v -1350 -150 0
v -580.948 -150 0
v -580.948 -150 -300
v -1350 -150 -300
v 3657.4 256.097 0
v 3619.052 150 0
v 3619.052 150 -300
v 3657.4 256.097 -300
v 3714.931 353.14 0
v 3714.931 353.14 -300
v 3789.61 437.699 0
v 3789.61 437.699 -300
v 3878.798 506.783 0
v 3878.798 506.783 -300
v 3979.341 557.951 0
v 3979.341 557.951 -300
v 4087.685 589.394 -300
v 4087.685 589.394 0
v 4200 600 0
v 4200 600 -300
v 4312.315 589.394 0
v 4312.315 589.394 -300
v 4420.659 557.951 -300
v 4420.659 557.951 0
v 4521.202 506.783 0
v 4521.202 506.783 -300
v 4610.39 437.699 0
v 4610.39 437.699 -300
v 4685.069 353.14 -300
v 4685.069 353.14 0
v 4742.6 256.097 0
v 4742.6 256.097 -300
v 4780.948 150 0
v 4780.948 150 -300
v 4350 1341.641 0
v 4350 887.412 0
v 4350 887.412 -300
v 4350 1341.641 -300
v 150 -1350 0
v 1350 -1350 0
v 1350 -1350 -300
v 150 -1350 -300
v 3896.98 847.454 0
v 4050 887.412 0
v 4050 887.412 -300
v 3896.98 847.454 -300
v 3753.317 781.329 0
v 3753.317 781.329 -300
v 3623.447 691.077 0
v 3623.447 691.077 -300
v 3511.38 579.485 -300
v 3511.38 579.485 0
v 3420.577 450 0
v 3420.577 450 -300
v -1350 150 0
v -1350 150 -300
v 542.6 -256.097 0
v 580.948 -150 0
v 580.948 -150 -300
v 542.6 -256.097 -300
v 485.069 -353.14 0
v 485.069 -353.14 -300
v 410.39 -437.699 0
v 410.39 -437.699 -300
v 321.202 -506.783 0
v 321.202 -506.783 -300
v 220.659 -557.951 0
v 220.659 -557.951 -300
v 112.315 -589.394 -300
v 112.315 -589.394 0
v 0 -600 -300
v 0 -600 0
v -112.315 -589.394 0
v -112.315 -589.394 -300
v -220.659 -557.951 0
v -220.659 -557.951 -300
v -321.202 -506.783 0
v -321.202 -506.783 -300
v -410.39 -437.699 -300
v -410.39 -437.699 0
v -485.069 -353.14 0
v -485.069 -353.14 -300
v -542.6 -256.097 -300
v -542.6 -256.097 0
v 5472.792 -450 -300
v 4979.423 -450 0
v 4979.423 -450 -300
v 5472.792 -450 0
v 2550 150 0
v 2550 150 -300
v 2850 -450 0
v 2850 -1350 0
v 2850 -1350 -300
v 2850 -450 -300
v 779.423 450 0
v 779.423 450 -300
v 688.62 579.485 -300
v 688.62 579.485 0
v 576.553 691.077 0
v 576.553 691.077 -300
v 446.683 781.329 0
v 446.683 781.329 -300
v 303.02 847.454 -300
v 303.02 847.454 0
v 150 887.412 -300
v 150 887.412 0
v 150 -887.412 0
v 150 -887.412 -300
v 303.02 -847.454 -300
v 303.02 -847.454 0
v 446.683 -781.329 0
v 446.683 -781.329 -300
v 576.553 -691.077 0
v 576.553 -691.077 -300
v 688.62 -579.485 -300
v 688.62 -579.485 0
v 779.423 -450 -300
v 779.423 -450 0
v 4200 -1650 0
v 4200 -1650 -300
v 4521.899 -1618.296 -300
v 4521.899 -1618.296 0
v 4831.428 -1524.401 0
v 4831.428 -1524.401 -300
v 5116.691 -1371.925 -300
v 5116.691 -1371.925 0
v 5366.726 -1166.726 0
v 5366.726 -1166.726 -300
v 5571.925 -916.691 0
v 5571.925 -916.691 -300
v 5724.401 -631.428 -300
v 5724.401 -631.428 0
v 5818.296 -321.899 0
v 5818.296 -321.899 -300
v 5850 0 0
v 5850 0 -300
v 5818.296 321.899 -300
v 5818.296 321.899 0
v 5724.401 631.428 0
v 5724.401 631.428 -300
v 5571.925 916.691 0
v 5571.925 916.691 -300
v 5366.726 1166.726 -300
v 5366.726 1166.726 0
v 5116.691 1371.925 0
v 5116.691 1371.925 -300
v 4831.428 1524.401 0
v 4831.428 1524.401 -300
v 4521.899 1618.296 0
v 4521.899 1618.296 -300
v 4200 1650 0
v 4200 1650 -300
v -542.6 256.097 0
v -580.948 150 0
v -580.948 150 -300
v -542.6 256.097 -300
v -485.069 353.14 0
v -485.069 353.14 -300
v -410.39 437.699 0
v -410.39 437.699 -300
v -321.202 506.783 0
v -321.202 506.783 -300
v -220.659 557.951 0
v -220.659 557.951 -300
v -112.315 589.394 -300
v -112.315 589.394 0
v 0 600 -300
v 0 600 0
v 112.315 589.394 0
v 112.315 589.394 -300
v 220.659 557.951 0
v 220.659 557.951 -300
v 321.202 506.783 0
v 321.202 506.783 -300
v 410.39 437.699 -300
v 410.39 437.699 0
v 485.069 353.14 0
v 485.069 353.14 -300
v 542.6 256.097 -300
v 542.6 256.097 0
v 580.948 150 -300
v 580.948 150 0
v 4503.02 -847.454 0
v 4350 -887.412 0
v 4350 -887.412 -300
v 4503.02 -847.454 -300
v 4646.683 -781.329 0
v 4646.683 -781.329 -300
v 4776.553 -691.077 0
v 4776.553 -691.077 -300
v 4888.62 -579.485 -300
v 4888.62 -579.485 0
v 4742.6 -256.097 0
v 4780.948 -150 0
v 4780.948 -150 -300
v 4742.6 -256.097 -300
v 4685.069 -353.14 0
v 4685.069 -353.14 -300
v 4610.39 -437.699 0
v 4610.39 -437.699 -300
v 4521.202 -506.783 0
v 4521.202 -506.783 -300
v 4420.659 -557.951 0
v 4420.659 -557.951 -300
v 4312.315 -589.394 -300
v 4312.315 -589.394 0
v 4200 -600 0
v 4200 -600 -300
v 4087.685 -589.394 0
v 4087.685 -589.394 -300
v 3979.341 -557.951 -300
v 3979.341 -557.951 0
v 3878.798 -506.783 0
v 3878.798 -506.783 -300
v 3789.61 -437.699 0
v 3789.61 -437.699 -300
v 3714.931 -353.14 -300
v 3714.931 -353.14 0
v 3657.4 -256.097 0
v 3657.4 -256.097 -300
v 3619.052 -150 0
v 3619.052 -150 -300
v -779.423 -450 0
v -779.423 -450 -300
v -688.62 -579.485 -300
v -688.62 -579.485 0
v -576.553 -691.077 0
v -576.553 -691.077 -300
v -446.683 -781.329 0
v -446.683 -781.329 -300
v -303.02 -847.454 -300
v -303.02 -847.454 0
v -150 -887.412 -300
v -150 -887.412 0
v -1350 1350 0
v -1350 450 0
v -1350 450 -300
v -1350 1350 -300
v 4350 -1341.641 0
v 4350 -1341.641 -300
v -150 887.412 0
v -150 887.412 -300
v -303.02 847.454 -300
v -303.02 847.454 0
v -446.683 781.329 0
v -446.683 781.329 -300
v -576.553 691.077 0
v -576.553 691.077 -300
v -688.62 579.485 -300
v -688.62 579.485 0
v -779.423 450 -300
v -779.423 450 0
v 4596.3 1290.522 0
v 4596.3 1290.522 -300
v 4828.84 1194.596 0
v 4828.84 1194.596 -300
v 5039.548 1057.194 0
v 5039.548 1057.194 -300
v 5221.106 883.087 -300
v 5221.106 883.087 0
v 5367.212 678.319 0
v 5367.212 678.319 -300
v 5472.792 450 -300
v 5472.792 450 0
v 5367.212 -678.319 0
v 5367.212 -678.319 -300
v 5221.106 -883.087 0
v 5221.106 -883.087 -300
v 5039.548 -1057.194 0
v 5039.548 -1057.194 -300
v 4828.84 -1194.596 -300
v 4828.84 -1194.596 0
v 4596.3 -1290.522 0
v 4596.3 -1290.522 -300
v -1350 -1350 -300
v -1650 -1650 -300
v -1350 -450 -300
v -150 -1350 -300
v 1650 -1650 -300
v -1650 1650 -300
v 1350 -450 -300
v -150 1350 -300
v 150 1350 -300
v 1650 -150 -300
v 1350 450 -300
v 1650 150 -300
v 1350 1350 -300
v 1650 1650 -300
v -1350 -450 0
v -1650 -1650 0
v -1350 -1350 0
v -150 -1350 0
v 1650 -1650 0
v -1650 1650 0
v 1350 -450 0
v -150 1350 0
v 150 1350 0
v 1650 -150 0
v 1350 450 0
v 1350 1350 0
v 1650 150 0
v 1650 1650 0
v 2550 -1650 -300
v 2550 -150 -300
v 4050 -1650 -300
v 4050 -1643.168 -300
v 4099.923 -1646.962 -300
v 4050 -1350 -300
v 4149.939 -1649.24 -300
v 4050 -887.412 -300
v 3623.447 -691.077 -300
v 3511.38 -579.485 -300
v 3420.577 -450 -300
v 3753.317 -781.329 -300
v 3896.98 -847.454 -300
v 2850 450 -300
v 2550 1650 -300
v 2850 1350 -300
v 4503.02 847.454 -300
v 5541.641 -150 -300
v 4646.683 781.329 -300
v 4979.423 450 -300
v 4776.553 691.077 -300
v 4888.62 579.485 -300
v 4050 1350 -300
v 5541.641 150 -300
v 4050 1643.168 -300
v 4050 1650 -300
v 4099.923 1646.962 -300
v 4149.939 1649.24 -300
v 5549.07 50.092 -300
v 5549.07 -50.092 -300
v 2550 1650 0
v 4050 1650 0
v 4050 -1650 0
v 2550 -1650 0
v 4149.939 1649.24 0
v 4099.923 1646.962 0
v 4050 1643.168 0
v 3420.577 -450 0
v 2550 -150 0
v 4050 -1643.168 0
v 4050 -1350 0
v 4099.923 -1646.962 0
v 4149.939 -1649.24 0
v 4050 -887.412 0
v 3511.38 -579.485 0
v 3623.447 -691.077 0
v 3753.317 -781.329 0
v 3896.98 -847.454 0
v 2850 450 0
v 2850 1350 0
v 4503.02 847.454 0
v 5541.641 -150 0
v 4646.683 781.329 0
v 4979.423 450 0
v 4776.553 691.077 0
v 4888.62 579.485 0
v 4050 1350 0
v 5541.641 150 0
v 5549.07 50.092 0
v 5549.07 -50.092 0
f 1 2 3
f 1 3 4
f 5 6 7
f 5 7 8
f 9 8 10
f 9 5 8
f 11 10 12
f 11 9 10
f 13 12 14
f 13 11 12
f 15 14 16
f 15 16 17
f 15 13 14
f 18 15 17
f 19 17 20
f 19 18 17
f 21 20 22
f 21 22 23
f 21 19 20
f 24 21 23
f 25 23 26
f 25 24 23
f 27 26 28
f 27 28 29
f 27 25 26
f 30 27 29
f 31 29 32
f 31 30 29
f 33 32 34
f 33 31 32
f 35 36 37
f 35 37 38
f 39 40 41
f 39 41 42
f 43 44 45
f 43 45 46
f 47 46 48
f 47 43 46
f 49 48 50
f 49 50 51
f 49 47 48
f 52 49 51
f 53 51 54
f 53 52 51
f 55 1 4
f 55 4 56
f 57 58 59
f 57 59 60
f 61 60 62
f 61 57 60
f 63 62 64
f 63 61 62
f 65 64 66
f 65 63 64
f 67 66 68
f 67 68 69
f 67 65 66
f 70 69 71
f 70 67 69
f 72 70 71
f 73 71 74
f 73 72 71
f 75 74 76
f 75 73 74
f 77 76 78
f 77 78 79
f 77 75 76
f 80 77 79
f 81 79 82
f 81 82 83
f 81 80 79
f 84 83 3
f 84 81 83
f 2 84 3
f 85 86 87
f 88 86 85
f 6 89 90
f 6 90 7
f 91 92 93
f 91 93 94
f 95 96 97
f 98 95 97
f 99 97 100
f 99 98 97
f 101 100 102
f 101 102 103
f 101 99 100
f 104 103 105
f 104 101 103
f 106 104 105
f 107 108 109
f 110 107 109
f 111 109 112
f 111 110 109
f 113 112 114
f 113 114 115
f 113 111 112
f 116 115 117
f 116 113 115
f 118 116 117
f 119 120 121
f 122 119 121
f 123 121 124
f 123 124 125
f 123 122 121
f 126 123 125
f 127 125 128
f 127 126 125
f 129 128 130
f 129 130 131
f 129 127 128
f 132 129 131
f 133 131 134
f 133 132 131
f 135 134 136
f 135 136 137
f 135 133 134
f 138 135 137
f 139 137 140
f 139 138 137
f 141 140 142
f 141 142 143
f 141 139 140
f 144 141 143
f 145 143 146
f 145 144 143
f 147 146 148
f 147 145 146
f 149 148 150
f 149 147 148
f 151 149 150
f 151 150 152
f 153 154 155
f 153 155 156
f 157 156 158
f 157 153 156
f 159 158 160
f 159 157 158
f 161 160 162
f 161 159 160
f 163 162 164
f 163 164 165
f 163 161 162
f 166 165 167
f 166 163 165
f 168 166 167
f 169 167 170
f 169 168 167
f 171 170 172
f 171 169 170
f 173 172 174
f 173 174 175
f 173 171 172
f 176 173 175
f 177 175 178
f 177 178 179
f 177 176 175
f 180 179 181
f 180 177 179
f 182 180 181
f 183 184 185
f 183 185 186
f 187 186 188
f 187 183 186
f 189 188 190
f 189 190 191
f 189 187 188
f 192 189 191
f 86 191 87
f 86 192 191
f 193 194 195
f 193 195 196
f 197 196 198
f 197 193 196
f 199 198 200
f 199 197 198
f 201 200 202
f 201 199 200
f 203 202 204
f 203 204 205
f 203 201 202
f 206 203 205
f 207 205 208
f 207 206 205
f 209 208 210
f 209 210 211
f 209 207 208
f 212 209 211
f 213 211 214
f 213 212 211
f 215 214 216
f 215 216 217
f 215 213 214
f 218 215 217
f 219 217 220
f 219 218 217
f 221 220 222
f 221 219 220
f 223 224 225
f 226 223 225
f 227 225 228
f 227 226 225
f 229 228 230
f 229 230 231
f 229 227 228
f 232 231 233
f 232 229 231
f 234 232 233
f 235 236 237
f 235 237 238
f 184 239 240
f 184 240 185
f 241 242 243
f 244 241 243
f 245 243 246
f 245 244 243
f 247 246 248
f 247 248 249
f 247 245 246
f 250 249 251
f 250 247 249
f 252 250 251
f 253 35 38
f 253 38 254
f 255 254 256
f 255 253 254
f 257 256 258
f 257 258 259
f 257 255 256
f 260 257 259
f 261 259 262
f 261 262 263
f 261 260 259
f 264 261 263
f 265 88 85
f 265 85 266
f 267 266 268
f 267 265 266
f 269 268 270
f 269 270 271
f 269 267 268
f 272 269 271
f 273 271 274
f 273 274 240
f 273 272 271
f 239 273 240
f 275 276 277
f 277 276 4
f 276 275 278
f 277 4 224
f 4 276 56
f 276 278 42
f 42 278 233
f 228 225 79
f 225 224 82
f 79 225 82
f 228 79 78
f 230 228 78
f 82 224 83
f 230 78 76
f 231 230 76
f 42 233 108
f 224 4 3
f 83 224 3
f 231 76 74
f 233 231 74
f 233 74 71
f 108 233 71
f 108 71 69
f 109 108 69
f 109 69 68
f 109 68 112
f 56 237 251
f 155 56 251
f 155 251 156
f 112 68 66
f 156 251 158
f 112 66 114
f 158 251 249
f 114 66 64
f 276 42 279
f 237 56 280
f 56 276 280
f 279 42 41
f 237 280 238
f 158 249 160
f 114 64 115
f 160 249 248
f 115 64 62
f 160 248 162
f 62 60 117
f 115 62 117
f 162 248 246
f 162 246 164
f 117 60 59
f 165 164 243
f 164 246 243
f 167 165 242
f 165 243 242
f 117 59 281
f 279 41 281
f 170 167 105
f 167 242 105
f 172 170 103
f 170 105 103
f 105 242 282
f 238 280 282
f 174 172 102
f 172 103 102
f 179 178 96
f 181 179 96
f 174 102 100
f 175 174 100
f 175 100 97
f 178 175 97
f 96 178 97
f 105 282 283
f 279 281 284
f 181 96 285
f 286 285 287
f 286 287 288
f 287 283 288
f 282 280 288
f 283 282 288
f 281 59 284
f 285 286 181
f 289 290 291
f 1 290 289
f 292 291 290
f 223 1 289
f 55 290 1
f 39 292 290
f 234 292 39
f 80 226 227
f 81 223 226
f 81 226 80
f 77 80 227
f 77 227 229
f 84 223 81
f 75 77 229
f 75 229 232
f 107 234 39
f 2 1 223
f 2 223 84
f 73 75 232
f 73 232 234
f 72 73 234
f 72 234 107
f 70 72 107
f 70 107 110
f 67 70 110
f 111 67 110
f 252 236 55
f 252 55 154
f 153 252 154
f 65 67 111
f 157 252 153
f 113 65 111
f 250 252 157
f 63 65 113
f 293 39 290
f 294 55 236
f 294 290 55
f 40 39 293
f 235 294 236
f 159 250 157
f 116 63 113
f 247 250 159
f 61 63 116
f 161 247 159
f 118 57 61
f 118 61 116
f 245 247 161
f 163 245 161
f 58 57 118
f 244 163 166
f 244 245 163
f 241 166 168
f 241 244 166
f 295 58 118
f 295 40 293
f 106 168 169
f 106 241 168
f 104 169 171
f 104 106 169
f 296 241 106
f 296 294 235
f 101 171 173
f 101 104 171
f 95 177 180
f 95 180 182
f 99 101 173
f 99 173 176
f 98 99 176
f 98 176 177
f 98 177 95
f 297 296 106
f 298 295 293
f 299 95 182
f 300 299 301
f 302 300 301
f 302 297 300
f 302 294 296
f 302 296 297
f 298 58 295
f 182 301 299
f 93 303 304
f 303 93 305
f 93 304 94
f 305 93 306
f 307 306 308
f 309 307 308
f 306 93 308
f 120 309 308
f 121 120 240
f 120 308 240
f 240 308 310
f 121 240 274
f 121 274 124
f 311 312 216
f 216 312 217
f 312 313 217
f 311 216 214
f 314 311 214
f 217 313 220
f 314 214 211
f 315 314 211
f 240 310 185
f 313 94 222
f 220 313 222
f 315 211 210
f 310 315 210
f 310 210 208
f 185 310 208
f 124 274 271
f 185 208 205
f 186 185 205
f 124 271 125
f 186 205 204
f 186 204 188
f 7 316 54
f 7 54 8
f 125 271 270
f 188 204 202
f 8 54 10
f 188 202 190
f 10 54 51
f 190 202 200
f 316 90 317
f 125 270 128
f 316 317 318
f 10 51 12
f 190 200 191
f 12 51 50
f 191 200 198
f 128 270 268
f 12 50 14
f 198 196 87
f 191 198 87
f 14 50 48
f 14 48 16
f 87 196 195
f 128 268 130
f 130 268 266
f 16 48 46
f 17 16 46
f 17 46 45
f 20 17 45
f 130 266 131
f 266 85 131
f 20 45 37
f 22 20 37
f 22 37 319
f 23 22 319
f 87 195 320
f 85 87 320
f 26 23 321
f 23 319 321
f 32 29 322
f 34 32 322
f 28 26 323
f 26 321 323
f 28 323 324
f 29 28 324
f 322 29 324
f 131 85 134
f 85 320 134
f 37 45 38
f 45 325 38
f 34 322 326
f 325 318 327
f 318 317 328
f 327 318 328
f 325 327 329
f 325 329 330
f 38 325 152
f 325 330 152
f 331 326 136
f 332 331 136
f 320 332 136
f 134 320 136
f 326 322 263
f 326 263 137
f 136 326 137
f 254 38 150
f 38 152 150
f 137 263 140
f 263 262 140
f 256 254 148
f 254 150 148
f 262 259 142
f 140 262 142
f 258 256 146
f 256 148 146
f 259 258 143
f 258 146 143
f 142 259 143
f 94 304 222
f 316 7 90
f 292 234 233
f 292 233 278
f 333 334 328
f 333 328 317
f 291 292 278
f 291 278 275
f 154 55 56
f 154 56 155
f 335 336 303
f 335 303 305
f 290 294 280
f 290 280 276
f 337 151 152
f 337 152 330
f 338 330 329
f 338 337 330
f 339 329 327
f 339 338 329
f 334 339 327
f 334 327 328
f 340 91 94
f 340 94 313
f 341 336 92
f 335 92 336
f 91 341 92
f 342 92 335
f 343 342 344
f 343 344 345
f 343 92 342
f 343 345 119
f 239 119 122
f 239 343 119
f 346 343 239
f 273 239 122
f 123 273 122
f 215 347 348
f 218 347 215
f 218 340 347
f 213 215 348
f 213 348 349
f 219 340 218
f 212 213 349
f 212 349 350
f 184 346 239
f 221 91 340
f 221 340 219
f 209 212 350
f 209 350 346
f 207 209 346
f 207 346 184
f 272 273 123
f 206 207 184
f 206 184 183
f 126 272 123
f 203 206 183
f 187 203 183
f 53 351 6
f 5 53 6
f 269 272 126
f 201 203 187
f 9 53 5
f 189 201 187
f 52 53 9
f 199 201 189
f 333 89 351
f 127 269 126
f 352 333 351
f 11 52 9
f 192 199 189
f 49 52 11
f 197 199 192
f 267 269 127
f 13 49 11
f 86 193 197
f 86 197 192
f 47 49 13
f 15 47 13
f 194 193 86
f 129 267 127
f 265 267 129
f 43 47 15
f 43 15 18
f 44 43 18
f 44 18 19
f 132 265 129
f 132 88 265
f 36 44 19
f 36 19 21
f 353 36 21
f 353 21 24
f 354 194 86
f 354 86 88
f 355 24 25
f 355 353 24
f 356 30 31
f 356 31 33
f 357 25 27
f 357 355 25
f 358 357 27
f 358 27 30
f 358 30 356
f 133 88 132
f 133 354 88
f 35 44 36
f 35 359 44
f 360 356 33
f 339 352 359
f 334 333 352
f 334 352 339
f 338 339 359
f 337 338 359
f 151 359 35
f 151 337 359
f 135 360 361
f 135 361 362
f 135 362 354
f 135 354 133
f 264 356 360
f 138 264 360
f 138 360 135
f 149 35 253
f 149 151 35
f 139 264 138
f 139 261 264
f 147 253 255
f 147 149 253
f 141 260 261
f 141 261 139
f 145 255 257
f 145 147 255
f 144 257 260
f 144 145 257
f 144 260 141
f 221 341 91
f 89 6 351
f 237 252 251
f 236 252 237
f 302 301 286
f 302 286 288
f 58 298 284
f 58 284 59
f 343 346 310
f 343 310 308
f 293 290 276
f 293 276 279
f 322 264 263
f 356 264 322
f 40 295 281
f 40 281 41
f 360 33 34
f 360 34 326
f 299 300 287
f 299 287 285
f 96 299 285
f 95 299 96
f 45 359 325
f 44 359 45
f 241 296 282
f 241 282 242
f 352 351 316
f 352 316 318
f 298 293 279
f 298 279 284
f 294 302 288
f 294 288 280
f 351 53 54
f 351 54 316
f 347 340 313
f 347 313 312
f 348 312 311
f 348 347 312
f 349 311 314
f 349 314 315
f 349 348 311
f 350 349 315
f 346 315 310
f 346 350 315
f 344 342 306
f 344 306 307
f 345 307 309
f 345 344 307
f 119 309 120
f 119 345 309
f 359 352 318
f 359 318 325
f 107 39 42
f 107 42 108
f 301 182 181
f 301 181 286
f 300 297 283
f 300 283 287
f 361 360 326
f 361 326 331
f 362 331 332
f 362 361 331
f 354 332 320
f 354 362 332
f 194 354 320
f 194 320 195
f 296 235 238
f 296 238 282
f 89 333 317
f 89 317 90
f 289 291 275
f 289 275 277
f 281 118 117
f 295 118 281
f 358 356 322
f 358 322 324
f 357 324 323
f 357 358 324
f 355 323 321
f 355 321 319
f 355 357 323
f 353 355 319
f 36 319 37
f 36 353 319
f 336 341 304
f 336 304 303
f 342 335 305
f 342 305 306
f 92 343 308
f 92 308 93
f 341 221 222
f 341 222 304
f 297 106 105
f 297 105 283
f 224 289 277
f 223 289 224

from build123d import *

# Parameters (mm, degrees)
F1_DEPTH = 300


with BuildPart() as f1:
    # F0 (on Top) → F1 (new body)
    with BuildSketch(Plane.XY):
        with BuildLine():
            Line((1650, 1650), (-1650, 1650))
            Line((-1650, 1650), (-1650, 450))
            Line((-1650, 450), (-1650, 150))
            Line((-1650, 150), (-1650, -191.250503))
            Line((-1650, -191.250503), (-1650, -450))
            Line((-1650, -450), (-1650, -1650))
            Line((-1650, -1650), (1650, -1650))
            Line((1650, -1650), (1650, -1350))
            Line((1650, -1350), (1650, -150))
            Line((1650, -150), (580.947502, -150))
            ThreePointArc((580.947502, -150), (0, -600), (-580.947502, -150))
            Line((-580.947502, -150), (-1350, -150))
            Line((-1350, -150), (-1350, 150))
            Line((-1350, 150), (-580.947502, 150))
            ThreePointArc((-580.947502, 150), (0, 600), (580.947502, 150))
            Line((580.947502, 150), (1650, 150))
            Line((1650, 150), (1650, 1650))
        make_face()
        with BuildLine():
            Line((-150, -1350), (-1350, -1350))
            Line((-1350, -1350), (-1350, -450))
            Line((-1350, -450), (-779.422863, -450))
            ThreePointArc((-779.422863, -450), (-513.603954, -739.060876), (-150, -887.411967))
            Line((-150, -887.411967), (-150, -1350))
        make_face(mode=Mode.SUBTRACT)
        with BuildLine():
            Line((1350, -450), (1350, -1350))
            Line((1350, -1350), (150, -1350))
            Line((150, -1350), (150, -887.411967))
            ThreePointArc((150, -887.411967), (513.603954, -739.060876), (779.422863, -450))
            Line((779.422863, -450), (1350, -450))
        make_face(mode=Mode.SUBTRACT)
        with BuildLine():
            Line((-1350, 450), (-1350, 1350))
            Line((-1350, 1350), (-150, 1350))
            Line((-150, 1350), (-150, 887.411967))
            ThreePointArc((-150, 887.411967), (-513.603954, 739.060876), (-779.422863, 450))
            Line((-779.422863, 450), (-1350, 450))
        make_face(mode=Mode.SUBTRACT)
        with BuildLine():
            Line((150, 1350), (1350, 1350))
            Line((1350, 1350), (1350, 450))
            Line((1350, 450), (779.422863, 450))
            ThreePointArc((779.422863, 450), (513.603954, 739.060876), (150, 887.411967))
            Line((150, 887.411967), (150, 1350))
        make_face(mode=Mode.SUBTRACT)
        with BuildLine():
            Line((5541.640786, -150), (4780.947502, -150))
            ThreePointArc((4780.947502, -150), (4200, -600), (3619.052498, -150))
            Line((3619.052498, -150), (2550, -150))
            Line((2550, -150), (2550, -1650))
            Line((2550, -1650), (4050, -1650))
            Line((4050, -1650), (4050, -1643.167673))
            ThreePointArc((4050, -1643.167673), (4124.922239, -1648.291033), (4200, -1650))
            ThreePointArc((4200, -1650), (5850, 0), (4200, 1650))
            ThreePointArc((4200, 1650), (4124.922239, 1648.291033), (4050, 1643.167673))
            Line((4050, 1643.167673), (4050, 1650))
            Line((4050, 1650), (2550, 1650))
            Line((2550, 1650), (2550, 150))
            Line((2550, 150), (3619.052498, 150))
            ThreePointArc((3619.052498, 150), (4200, 600), (4780.947502, 150))
            Line((4780.947502, 150), (5541.640786, 150))
            ThreePointArc((5541.640786, 150), (5550, 0), (5541.640786, -150))
        make_face()
        with BuildLine():
            Line((2850, -450), (3420.577137, -450))
            ThreePointArc((3420.577137, -450), (3686.396046, -739.060876), (4050, -887.411967))
            Line((4050, -887.411967), (4050, -1350))
            Line((4050, -1350), (2850, -1350))
            Line((2850, -1350), (2850, -450))
        make_face(mode=Mode.SUBTRACT)
        with BuildLine():
            ThreePointArc((5472.792206, -450), (5039.547639, -1057.194287), (4350, -1341.640786))
            Line((4350, -1341.640786), (4350, -887.411967))
            ThreePointArc((4350, -887.411967), (4713.603954, -739.060876), (4979.422863, -450))
            Line((4979.422863, -450), (5472.792206, -450))
        make_face(mode=Mode.SUBTRACT)
        with BuildLine():
            Line((2850, 450), (2850, 1350))
            Line((2850, 1350), (4050, 1350))
            Line((4050, 1350), (4050, 887.411967))
            ThreePointArc((4050, 887.411967), (3686.396046, 739.060876), (3420.577137, 450))
            Line((3420.577137, 450), (2850, 450))
        make_face(mode=Mode.SUBTRACT)
        with BuildLine():
            Line((4350, 887.411967), (4350, 1341.640786))
            ThreePointArc((4350, 1341.640786), (5039.547639, 1057.194287), (5472.792206, 450))
            Line((5472.792206, 450), (4979.422863, 450))
            ThreePointArc((4979.422863, 450), (4713.603954, 739.060876), (4350, 887.411967))
        make_face(mode=Mode.SUBTRACT)
    extrude(amount=-F1_DEPTH)


solid = f1.part
